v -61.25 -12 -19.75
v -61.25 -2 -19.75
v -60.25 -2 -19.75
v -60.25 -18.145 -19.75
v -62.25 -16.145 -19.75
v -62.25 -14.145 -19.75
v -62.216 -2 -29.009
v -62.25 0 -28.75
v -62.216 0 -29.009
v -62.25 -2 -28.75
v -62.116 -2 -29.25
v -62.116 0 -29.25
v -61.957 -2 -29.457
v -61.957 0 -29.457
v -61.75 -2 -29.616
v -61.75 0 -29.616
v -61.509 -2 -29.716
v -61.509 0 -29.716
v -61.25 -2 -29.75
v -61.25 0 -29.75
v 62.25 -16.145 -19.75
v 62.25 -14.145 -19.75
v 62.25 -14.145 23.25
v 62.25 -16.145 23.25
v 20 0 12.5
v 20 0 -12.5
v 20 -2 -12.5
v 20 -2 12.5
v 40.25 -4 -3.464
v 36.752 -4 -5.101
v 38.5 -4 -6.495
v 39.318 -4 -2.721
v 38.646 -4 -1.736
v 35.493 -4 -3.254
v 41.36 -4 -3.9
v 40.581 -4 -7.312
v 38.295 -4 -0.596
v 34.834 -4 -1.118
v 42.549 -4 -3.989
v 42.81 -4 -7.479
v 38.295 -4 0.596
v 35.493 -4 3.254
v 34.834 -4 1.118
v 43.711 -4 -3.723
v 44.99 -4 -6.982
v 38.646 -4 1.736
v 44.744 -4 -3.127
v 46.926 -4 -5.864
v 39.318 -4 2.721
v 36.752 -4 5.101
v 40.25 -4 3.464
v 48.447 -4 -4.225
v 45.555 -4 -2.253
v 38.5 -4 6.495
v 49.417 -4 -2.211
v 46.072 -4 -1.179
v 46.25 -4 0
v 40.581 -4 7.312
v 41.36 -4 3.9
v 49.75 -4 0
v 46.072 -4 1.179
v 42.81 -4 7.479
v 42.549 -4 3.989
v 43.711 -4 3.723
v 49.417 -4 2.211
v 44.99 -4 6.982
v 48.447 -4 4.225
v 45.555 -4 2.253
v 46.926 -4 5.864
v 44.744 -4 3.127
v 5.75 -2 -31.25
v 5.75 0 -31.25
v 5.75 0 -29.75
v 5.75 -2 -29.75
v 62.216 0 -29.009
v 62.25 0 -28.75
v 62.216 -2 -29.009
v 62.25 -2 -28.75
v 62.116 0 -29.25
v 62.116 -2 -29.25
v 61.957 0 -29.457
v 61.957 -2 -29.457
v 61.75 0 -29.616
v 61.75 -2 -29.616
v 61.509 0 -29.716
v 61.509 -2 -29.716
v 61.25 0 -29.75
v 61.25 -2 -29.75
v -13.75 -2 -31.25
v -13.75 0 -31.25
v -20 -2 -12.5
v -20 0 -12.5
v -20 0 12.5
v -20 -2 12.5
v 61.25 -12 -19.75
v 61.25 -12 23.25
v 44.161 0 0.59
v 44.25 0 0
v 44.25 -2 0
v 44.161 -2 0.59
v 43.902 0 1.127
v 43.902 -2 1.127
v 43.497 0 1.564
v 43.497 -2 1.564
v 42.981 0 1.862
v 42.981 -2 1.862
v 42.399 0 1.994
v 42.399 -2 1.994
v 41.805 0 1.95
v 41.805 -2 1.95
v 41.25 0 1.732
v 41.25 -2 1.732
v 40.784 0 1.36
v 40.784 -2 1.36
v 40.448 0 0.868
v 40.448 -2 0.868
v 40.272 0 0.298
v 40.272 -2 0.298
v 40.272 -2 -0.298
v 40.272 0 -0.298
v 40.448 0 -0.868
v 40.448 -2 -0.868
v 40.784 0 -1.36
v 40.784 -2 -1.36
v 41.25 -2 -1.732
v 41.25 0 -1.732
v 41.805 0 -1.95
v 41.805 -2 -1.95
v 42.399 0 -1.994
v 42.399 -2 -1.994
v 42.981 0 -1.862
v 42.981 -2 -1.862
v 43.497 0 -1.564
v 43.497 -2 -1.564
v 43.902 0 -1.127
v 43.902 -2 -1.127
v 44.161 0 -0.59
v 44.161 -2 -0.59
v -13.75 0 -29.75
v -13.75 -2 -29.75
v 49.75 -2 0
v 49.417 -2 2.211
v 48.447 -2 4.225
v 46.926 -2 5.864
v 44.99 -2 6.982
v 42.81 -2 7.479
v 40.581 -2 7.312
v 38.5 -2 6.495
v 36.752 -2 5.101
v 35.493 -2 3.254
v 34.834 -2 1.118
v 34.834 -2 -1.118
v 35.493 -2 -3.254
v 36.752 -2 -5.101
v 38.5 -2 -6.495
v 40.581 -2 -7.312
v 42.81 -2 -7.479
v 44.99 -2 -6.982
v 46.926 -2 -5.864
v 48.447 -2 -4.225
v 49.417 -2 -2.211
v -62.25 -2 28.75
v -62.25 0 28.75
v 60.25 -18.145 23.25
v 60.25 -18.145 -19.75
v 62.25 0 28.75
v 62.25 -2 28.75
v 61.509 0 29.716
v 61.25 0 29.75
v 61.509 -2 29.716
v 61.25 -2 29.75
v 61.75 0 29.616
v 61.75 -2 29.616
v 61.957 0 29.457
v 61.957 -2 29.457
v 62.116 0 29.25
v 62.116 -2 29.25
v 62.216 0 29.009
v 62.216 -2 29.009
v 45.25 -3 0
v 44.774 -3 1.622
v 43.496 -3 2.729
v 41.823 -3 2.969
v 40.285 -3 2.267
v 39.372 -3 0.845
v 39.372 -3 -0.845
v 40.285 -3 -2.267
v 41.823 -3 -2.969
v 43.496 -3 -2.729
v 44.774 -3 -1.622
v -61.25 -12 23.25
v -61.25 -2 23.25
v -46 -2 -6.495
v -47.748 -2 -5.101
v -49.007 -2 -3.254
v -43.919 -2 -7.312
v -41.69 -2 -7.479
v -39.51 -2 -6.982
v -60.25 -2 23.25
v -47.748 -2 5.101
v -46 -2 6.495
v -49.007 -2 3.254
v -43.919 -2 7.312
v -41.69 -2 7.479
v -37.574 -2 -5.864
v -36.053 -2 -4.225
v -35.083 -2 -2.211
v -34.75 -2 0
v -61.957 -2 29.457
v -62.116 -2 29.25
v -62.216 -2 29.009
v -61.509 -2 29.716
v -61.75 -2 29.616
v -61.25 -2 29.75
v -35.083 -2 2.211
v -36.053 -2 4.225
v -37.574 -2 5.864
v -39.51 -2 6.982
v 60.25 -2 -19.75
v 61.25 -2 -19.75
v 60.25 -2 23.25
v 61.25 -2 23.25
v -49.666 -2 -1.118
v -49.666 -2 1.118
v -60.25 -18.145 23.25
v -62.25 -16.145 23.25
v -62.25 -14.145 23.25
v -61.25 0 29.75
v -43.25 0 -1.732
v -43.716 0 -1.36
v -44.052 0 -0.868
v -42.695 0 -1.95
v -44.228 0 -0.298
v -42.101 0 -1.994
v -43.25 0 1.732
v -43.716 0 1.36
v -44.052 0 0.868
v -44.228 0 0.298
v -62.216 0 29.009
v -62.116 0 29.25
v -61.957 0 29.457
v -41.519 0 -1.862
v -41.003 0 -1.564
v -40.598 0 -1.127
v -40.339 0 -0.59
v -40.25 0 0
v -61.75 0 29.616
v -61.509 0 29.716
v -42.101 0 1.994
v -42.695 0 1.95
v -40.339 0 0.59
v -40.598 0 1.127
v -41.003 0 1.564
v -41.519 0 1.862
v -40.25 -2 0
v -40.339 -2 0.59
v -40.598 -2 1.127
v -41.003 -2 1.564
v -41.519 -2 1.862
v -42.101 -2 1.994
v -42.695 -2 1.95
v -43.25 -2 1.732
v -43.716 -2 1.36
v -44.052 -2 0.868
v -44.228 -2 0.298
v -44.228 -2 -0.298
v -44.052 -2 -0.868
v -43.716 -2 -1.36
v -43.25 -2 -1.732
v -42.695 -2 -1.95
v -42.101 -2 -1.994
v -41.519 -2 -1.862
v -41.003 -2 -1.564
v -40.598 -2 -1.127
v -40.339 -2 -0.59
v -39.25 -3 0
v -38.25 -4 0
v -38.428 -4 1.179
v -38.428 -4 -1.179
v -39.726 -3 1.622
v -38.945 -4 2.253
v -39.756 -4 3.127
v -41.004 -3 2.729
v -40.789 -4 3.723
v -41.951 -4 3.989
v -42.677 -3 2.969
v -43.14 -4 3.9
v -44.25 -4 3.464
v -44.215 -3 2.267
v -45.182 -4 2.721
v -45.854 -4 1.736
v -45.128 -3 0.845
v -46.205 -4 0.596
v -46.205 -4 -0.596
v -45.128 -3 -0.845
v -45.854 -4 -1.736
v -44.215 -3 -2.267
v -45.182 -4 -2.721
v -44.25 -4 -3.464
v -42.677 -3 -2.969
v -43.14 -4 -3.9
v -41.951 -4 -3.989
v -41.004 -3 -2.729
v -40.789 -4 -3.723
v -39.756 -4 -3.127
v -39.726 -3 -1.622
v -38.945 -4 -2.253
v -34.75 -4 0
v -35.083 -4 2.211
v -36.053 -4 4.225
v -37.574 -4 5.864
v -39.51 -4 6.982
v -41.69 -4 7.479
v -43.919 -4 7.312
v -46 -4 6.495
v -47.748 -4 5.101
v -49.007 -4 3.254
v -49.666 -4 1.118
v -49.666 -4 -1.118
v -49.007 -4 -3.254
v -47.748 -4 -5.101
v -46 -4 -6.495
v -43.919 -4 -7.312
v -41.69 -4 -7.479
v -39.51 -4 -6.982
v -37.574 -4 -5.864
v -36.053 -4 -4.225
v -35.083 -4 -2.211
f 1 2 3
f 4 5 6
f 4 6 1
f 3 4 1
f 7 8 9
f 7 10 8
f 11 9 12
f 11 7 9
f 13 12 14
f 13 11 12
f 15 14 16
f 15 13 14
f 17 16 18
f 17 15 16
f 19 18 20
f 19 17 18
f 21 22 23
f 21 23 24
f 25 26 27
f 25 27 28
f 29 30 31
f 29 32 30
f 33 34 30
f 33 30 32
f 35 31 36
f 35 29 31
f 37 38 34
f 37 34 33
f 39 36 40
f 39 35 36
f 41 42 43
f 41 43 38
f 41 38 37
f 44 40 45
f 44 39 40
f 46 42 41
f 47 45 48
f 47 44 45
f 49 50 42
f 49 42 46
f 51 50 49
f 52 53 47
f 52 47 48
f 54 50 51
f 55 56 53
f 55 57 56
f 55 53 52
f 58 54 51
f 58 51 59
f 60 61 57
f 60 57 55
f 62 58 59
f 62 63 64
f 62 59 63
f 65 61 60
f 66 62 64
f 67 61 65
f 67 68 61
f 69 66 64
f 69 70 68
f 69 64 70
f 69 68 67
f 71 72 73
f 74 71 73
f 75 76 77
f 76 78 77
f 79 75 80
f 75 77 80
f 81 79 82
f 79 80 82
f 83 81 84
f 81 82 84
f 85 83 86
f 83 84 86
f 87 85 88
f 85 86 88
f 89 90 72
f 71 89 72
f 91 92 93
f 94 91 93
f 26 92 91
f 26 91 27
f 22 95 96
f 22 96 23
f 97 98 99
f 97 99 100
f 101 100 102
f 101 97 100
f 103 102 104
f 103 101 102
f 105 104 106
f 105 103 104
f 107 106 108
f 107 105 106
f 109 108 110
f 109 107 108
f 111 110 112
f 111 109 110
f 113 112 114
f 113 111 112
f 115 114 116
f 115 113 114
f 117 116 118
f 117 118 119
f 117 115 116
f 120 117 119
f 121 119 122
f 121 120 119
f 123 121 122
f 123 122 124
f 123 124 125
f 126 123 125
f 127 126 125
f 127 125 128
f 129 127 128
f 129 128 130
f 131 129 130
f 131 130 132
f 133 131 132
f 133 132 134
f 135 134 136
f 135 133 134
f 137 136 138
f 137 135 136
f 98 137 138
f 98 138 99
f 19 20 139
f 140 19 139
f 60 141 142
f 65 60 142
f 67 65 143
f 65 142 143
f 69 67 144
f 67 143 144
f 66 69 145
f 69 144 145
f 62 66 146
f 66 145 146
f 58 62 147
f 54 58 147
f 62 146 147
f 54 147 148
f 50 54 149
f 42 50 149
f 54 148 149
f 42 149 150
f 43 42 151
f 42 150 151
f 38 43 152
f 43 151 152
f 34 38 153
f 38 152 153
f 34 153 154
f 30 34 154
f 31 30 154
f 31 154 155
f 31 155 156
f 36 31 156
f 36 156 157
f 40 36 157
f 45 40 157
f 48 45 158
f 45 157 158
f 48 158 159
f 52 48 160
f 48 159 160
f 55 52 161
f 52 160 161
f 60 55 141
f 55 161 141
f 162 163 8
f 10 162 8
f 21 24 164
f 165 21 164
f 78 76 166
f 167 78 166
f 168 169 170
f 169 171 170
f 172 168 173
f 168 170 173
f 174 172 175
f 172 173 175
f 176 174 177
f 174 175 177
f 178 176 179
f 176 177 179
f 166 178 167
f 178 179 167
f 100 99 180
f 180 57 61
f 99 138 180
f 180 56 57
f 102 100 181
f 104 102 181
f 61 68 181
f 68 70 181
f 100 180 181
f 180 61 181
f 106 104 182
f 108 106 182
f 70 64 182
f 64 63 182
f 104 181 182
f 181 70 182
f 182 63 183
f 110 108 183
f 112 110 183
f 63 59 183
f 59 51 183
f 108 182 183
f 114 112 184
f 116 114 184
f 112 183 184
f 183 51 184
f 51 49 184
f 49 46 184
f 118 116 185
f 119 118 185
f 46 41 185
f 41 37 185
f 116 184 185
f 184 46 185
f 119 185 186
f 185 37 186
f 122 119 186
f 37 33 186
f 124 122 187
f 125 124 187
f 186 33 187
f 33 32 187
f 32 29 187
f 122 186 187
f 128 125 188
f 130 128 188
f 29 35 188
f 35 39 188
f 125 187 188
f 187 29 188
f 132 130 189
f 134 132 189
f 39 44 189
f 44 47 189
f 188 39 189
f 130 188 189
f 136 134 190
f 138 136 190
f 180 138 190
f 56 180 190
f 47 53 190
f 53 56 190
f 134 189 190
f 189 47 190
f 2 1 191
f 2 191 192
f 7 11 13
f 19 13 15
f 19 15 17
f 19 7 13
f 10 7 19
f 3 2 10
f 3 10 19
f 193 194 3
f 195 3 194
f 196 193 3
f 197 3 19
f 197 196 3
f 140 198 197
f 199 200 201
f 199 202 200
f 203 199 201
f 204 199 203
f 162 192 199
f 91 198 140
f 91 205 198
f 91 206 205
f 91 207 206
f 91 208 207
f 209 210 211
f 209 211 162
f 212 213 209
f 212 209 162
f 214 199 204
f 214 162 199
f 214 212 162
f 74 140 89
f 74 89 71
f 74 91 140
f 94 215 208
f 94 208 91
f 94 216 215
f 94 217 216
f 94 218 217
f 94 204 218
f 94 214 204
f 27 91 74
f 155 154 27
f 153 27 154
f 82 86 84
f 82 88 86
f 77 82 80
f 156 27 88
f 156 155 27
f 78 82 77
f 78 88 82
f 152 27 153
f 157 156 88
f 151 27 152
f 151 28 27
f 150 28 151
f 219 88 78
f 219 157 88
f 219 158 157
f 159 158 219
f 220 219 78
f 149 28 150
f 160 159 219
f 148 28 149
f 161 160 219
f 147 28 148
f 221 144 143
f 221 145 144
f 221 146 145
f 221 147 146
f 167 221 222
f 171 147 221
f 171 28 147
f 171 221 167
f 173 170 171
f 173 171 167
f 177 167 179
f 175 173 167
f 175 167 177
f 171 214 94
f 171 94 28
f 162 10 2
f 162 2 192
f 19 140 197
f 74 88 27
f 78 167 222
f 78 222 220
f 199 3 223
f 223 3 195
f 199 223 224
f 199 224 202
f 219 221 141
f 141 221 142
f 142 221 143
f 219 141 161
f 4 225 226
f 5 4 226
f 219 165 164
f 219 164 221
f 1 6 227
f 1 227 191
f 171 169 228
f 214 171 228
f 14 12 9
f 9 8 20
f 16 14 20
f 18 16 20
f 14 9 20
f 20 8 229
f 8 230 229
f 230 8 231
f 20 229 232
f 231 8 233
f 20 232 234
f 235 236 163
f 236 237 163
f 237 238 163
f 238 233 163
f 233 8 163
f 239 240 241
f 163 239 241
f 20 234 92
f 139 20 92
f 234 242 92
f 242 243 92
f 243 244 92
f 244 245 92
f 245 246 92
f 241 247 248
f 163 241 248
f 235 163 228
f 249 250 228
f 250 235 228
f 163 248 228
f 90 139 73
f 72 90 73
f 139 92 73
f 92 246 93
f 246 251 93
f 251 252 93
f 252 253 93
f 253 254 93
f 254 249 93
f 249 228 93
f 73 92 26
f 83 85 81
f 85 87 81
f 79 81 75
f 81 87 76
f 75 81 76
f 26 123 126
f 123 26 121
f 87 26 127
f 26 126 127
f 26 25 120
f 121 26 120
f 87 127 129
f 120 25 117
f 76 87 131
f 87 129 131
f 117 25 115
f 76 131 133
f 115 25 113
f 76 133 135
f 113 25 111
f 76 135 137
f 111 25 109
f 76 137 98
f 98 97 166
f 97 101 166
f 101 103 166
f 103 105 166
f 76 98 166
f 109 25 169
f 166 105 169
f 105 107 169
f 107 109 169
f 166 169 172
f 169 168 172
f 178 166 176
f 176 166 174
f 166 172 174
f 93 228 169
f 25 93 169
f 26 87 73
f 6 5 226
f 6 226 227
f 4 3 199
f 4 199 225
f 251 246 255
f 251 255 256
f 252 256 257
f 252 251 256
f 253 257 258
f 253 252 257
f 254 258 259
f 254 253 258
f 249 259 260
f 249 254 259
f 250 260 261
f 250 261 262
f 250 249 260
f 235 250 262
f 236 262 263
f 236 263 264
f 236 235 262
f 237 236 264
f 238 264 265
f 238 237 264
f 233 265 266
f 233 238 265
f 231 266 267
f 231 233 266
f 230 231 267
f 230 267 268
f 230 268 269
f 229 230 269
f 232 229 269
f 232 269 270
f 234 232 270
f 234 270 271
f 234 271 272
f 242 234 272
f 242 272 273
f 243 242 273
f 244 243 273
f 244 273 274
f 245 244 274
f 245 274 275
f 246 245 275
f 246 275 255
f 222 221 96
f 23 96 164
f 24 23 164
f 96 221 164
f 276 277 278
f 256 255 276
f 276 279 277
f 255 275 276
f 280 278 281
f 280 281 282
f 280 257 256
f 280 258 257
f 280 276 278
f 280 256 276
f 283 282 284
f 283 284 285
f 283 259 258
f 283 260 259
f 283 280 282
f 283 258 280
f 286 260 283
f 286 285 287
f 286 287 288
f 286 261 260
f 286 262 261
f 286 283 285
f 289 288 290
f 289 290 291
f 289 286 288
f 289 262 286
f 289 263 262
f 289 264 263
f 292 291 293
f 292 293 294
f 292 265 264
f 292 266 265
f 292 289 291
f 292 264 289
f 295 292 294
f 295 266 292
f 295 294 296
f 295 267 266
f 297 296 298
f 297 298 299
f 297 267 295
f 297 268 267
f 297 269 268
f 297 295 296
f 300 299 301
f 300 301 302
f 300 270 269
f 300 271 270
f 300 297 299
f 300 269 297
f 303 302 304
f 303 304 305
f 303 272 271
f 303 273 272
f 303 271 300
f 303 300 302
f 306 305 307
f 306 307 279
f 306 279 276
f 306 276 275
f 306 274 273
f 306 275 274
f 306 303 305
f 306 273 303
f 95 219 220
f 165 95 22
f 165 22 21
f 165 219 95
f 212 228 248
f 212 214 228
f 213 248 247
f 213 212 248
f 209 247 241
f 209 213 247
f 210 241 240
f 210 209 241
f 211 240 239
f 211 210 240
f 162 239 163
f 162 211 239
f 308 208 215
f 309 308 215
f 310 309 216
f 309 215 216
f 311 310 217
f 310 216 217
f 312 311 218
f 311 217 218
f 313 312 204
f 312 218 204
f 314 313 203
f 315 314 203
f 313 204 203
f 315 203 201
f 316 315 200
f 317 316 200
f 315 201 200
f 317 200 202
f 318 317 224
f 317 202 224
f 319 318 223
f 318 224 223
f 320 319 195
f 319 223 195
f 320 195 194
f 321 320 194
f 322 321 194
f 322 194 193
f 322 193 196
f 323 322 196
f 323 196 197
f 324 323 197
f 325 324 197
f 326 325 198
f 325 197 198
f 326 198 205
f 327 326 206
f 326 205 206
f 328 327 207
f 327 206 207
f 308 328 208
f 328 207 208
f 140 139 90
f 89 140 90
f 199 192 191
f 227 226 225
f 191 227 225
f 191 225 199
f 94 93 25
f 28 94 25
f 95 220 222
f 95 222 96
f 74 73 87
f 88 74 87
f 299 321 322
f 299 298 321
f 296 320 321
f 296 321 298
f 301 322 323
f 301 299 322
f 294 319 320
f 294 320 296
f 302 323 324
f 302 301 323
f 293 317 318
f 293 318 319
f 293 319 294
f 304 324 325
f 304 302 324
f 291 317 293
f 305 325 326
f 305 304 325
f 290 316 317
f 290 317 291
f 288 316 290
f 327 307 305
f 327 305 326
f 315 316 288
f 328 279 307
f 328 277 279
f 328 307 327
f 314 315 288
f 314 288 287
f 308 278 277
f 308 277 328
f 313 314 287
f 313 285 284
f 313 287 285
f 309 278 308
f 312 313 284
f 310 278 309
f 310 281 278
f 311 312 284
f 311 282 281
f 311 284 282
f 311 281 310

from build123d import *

# Parameters (mm, degrees)
F0_R     = 2
F0_W     = 40
F0_H     = 25
F1_DEPTH = 2
F3_START = -10
F3_DEPTH = 43
F4_R     = 1
F5_R     = 7.5
F5_R_2   = 2
F6_DEPTH = 2
F7_SIZE  = 2


with BuildPart() as f1:
    # F0 (on Front) → F1 (new body)
    with BuildSketch(Plane.XZ):
        Polygon((62.25, 29.75), (-62.25, 29.75), (-62.25, -29.75), (-13.75, -29.75), (-13.75, -31.25), (5.75, -31.25), (5.75, -29.75), (62.25, -29.75), align=None)
        with Locations((-42.25, 0)):
            Circle(F0_R, mode=Mode.SUBTRACT)
        Rectangle(F0_W, F0_H, mode=Mode.SUBTRACT)
        with Locations((42.25, 0)):
            Circle(F0_R, mode=Mode.SUBTRACT)
    extrude(amount=F1_DEPTH)

    # F2 (on face) → F3 (join)
    with BuildSketch(Plane(origin=(0, 0, -29.75), x_dir=(1, 0, 0), z_dir=(0, 0, -1)).offset(F3_START)):
        Polygon((-61.25, 12), (-61.25, 2), (-60.25, 2), (-60.25, 18.1445069205), (-62.25, 16.1445069205), (-62.25, 14.1445069205), align=None)
        Polygon((61.25, 2), (61.25, 12), (62.25, 14.1445069205), (62.25, 16.1445069205), (60.25, 18.1445069205), (60.25, 2), align=None)
    extrude(amount=-F3_DEPTH)

    # F4
    f4_edges = [f1.edges().sort_by_distance(p)[0] for p in [
        (-62.25, -1, -29.75),
        (62.25, -1, -29.75),
        (62.25, -1, 29.75),
        (-62.25, -1, 29.75),
    ]]
    fillet(f4_edges, radius=F4_R)

    # F5 (on face) → F6 (join)
    with BuildSketch(Plane.XZ.offset(2)):
        with Locations((-42.25, 0)):
            Circle(F5_R)
        with Locations((-42.25, 0)):
            Circle(F5_R_2, mode=Mode.SUBTRACT)
        with Locations((42.25, 0)):
            Circle(F5_R)
        with Locations((42.25, 0)):
            Circle(F5_R_2, mode=Mode.SUBTRACT)
    extrude(amount=F6_DEPTH)

    # F7
    f7_edges = [f1.edges().sort_by_distance(p)[0] for p in [
        (-44.25, -4, 0),
        (40.25, -4, 0),
    ]]
    chamfer(f7_edges, length=F7_SIZE)


solid = f1.part
